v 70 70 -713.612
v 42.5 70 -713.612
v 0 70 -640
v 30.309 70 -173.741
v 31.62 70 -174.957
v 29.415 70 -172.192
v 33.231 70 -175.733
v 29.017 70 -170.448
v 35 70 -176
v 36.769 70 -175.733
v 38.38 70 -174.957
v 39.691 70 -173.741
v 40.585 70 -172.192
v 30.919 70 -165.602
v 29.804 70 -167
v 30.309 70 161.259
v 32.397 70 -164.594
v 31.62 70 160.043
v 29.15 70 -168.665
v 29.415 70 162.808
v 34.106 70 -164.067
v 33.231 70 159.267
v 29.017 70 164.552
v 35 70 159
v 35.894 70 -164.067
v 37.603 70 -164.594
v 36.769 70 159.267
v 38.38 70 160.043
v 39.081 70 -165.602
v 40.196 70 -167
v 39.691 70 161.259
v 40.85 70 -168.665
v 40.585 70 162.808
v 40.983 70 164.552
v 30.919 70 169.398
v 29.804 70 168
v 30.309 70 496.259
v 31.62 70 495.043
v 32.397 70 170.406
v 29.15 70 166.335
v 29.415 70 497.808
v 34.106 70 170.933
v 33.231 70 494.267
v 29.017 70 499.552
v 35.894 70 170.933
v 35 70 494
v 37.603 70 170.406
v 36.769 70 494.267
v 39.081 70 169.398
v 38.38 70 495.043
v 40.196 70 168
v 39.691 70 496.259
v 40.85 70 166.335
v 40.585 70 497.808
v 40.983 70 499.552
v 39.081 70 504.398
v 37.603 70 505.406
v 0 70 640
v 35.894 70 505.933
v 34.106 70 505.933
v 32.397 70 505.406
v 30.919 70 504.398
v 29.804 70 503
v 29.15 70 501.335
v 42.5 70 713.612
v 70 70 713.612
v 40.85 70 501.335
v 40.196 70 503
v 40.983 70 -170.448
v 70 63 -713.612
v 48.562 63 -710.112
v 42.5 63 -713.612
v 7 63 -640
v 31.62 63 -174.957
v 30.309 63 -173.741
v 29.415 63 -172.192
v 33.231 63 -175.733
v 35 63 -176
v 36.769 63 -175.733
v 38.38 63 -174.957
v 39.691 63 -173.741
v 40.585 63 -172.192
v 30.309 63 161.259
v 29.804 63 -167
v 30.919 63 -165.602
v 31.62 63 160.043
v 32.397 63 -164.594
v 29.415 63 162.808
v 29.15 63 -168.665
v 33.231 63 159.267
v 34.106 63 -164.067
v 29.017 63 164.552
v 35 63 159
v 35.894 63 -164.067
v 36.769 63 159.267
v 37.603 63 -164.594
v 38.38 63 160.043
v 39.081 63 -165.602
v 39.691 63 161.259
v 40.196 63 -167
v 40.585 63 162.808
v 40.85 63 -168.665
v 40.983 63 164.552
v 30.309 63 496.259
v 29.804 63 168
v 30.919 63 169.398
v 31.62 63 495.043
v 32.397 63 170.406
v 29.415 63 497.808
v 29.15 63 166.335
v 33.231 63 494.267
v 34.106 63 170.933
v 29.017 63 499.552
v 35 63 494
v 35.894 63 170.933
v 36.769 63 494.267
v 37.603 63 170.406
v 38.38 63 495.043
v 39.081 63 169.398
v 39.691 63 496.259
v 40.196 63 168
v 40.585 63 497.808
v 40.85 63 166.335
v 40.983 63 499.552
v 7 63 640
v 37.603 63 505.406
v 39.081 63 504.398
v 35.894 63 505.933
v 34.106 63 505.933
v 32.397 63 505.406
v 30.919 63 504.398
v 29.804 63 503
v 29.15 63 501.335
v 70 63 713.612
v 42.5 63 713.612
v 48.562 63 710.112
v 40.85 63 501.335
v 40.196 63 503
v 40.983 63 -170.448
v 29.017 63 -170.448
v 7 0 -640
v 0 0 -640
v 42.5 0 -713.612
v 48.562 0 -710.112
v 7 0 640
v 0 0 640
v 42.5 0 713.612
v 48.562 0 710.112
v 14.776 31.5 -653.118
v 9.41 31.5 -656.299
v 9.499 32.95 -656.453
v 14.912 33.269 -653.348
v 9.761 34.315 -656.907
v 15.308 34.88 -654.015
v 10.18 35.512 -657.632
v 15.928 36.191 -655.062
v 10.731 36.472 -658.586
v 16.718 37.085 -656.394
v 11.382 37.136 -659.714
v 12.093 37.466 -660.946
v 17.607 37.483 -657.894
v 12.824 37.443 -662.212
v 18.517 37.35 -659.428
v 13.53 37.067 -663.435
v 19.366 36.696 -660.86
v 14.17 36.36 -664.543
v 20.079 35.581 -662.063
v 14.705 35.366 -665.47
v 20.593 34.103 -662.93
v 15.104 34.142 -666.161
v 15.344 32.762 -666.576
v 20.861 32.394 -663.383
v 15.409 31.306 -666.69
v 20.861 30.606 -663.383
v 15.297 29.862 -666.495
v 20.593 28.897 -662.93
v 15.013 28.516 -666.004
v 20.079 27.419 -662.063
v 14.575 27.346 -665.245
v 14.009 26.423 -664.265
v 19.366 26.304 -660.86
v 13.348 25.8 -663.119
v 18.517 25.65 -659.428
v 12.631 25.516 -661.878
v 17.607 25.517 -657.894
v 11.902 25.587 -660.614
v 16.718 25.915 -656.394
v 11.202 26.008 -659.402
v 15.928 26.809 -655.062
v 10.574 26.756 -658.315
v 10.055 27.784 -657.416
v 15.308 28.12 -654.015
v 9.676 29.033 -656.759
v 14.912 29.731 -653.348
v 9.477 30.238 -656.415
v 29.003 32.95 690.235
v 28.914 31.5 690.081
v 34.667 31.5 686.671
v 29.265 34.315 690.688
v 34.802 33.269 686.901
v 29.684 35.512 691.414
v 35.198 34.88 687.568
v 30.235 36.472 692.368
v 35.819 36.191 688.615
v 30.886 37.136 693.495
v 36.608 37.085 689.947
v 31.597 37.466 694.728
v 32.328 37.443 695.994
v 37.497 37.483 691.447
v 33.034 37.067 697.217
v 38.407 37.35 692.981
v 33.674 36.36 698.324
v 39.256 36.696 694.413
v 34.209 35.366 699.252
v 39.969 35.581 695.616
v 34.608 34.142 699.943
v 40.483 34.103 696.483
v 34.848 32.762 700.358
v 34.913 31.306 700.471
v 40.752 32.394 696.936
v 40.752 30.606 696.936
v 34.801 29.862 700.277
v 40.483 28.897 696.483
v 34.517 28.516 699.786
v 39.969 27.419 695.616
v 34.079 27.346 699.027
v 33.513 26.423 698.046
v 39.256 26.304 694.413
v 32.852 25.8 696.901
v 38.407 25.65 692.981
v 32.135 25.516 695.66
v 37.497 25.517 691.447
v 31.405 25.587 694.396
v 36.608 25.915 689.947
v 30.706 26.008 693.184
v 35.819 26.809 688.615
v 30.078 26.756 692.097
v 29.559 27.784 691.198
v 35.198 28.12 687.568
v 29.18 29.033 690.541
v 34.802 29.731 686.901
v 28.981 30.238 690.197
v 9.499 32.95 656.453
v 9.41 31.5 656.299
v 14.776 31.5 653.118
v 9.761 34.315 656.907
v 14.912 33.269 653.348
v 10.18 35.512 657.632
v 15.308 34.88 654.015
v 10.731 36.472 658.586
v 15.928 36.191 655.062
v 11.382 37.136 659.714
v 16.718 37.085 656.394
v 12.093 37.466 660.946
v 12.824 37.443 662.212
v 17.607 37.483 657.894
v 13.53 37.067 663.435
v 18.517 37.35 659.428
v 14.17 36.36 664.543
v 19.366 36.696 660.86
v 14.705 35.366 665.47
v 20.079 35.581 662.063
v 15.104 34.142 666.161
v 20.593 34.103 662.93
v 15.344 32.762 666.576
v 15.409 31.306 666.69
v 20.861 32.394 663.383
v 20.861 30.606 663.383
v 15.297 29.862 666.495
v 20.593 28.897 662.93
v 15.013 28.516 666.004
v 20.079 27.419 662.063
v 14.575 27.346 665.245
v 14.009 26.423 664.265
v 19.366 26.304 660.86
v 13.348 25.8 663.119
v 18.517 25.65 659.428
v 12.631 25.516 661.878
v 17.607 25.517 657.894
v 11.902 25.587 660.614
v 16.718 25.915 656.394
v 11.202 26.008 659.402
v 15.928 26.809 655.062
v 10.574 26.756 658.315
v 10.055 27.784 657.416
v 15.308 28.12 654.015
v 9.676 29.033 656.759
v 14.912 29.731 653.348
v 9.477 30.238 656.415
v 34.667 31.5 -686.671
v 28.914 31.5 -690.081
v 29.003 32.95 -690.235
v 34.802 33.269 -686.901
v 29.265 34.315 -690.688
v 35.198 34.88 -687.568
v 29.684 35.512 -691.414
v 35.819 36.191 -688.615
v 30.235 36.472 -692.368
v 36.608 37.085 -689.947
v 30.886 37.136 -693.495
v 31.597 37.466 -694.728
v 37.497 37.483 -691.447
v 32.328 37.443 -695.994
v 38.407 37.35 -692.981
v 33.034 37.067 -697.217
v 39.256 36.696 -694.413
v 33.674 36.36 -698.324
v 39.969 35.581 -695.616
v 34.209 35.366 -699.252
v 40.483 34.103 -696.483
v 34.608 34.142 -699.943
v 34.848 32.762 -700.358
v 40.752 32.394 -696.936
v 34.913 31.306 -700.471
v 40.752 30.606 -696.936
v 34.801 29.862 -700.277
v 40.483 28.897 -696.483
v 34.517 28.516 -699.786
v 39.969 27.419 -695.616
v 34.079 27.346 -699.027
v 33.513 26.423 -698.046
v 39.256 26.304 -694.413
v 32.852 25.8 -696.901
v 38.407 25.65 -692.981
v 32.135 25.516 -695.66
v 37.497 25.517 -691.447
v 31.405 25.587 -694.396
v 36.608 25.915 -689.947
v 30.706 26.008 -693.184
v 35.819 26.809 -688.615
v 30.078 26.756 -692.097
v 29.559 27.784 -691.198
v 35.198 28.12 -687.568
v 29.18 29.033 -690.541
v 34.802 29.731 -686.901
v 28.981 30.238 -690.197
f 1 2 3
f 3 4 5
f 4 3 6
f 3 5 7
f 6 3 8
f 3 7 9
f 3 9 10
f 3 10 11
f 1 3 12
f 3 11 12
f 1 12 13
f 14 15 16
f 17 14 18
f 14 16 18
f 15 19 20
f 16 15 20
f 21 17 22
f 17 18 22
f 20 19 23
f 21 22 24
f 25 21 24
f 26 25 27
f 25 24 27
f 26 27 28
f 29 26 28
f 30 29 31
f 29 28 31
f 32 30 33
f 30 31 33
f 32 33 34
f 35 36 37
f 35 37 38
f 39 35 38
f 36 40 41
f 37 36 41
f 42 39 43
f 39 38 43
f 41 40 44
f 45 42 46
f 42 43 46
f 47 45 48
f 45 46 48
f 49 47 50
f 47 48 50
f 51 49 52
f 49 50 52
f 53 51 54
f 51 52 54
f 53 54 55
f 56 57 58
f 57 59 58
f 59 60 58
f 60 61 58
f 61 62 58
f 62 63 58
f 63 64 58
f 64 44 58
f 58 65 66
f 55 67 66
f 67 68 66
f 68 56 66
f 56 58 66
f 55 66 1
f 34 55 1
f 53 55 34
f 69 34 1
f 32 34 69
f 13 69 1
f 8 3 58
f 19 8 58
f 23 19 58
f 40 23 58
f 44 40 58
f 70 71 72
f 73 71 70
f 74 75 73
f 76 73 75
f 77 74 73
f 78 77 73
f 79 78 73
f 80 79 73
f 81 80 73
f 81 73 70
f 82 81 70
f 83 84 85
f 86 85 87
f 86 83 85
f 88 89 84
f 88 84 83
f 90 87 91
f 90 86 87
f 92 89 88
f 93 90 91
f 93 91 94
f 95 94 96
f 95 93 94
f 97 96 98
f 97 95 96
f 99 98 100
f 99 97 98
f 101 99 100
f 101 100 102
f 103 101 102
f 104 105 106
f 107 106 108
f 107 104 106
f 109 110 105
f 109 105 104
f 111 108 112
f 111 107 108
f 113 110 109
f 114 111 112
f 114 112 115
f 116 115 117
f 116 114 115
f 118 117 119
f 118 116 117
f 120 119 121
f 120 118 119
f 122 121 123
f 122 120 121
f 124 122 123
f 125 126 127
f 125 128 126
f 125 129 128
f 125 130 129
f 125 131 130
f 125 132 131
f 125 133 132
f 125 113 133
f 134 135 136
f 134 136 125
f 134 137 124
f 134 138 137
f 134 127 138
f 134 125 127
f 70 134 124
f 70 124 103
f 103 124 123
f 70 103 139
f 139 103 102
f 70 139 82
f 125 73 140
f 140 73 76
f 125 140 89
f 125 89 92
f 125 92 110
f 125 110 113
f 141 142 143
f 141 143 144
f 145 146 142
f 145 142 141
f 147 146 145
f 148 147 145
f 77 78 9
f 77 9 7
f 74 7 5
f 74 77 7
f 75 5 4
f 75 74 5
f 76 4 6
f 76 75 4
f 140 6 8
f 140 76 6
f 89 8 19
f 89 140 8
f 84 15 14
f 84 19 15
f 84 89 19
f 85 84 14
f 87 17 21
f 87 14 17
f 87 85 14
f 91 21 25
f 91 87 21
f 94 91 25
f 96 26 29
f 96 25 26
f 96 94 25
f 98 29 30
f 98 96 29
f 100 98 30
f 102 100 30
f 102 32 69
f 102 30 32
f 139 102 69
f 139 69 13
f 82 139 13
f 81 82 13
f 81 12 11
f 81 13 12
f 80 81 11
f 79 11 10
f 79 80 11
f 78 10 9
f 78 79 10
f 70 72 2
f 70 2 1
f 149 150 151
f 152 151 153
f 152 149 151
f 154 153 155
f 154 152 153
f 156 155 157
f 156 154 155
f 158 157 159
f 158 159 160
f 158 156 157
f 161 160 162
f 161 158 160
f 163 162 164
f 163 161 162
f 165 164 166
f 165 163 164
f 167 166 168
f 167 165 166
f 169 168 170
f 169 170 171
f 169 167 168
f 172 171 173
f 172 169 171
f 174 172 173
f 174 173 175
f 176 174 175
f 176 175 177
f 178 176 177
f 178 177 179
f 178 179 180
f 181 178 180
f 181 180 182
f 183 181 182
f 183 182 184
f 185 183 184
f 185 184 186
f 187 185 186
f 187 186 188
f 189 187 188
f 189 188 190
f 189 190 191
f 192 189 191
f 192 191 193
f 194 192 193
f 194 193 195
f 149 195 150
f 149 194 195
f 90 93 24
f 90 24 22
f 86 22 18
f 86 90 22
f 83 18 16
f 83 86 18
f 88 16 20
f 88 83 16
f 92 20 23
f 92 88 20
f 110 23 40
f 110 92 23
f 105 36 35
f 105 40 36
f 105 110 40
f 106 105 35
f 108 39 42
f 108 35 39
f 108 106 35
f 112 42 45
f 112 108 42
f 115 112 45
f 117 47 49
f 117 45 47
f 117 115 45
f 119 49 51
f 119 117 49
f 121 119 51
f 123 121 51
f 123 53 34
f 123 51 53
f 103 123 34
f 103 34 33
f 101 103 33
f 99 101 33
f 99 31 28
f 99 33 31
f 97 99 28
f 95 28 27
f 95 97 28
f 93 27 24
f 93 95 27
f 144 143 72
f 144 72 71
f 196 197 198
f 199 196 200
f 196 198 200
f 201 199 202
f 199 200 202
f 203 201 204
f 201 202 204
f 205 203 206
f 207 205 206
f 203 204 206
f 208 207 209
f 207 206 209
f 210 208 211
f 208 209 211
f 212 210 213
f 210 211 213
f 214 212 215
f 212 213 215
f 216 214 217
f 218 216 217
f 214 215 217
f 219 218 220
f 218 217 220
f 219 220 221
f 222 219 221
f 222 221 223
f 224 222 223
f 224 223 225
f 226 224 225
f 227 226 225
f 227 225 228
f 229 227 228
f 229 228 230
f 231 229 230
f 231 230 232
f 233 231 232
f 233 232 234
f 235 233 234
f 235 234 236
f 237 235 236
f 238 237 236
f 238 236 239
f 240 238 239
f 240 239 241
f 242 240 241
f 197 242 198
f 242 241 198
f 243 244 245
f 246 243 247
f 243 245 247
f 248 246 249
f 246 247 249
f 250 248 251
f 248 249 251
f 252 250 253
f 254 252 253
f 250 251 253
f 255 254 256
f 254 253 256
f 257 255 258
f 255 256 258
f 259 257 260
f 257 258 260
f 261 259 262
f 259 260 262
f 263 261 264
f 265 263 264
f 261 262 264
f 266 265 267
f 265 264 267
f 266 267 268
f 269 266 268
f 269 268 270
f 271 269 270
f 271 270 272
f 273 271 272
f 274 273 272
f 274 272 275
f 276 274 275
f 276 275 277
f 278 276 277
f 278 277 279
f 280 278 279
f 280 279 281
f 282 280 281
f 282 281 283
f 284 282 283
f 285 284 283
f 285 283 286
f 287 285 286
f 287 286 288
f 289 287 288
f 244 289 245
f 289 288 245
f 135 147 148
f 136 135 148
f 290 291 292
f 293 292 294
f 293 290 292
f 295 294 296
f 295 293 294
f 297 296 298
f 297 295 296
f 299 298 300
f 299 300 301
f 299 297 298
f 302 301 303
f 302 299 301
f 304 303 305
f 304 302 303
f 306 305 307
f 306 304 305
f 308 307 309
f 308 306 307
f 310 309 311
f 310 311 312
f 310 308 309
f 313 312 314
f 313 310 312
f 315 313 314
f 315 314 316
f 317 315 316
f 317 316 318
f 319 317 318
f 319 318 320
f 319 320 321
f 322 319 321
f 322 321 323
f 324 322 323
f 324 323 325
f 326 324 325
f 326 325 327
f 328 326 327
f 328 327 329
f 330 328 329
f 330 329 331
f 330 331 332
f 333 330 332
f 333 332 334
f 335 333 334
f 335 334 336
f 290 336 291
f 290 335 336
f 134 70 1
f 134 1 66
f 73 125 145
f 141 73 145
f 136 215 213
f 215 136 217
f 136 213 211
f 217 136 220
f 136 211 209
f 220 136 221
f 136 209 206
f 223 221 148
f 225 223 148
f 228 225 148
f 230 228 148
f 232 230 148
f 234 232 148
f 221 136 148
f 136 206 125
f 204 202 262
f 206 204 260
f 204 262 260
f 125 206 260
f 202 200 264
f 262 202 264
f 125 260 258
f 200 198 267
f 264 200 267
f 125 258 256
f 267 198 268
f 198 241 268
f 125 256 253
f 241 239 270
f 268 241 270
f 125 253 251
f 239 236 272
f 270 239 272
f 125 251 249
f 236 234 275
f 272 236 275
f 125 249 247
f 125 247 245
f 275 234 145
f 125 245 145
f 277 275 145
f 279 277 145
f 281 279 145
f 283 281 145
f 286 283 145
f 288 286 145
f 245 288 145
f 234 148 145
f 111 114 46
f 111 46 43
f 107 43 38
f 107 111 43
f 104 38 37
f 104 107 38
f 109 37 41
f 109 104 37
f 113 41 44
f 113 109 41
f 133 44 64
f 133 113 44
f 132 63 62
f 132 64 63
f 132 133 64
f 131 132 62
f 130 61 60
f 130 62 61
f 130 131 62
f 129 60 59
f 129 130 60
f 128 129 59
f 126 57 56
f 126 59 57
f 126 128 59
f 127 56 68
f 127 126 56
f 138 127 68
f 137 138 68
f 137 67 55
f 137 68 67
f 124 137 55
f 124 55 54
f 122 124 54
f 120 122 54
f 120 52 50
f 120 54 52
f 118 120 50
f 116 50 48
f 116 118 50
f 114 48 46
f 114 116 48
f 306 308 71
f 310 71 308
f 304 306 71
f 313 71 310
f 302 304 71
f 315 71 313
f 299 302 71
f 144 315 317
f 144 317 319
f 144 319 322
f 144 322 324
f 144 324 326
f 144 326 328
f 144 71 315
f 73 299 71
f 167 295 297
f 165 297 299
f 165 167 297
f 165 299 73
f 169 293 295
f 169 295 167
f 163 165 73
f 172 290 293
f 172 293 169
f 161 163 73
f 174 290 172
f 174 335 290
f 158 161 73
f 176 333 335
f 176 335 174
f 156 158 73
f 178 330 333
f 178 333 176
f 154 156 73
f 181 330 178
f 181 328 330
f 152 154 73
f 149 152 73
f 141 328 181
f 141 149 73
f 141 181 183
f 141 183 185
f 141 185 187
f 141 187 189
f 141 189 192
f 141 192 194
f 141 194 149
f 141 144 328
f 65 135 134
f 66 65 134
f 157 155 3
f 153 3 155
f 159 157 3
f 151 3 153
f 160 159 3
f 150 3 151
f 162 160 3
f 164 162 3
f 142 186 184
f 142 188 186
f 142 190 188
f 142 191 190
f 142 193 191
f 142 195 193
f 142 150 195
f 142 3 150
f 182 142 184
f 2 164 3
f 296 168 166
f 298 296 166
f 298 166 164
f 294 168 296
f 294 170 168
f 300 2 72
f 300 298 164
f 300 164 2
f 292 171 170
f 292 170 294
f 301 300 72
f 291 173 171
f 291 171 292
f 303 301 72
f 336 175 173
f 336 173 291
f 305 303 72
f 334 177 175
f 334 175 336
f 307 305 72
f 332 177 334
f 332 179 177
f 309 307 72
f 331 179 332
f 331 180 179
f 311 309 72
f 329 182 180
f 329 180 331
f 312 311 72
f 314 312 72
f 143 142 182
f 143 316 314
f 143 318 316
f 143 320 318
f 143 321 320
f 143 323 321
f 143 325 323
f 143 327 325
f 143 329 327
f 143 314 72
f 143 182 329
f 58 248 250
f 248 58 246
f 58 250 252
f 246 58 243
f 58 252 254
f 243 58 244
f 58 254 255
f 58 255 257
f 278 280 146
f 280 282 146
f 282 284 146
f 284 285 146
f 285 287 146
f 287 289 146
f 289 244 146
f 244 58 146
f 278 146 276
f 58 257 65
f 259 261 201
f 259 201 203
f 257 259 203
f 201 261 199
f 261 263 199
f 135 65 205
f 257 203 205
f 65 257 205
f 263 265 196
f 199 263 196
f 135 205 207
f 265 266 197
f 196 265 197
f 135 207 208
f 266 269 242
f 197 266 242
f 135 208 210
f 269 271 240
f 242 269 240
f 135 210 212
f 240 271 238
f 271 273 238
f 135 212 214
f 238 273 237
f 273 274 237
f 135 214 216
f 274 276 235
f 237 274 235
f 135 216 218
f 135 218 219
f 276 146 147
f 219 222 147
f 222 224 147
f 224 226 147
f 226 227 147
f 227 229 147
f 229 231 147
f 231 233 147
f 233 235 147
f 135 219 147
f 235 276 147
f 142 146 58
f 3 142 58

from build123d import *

# Parameters (mm, degrees)
BOSS_EXTRUDE1_DEPTH     = 640
BOSS_EXTRUDE2_DEPTH     = 63
BOSS_EXTRUDE3_DEPTH     = 7
SKETCH26_R              = 6
CUT_EXTRUDE2_DEPTH      = 10
CUT_EXTRUDE1_DEPTH      = 10
CUT_EXTRUDE1_DEPTH_BACK = 10
SKETCH28_R              = 6


with BuildPart() as part:
    # Sketch1 → Boss-Extrude1 (new body)
    with BuildSketch(Plane.XY):
        Polygon((0, 0), (0, 70), (70, 70), (70, 63), (7, 63), (7, 0), align=None)
    extrude(amount=BOSS_EXTRUDE1_DEPTH)

    # Sketch23 → Boss-Extrude2 (add)
    with BuildSketch(Plane(origin=(0, 0, 0), x_dir=(1, 0, 0), z_dir=(0, 1, 0))):
        Polygon((0, -640), (42.5, -713.612159322), (48.562177826, -710.112159322), (7, -640), align=None)
    extrude(amount=BOSS_EXTRUDE2_DEPTH)

    # Sketch25 → Boss-Extrude3 (add)
    with BuildSketch(Plane(origin=(0, 63, 0), x_dir=(1, 0, 0), z_dir=(0, 1, 0))):
        Polygon((70, -640), (0, -640), (42.5, -713.612159322), (70, -713.612159322), align=None)
    extrude(amount=BOSS_EXTRUDE3_DEPTH)

    # Sketch26 → Cut-Extrude2 (cut)
    with BuildSketch(Plane(origin=(-275.556719825, 0, 163.348804279), x_dir=(-0.5099316128113042, 0, -0.8602149442178172), z_dir=(0.8602149442178172, 0, -0.5099316128113042))):
        with Locations((-614.36248118, 31.5)):
            Circle(SKETCH26_R)
        with Locations((-575.357085589, 31.5)):
            Circle(SKETCH26_R)
    extrude(amount=-CUT_EXTRUDE2_DEPTH, mode=Mode.SUBTRACT)

    # Mirror1: part across plane


with BuildPart() as part_1:
    add(part.part)
    add(part.part.mirror(Plane.XY))

    # Sketch28 → Cut-Extrude1 (cut, two sides: drawn at the far end of the back side and taken through both)
    with BuildSketch(Plane(origin=(0, 70, 0), x_dir=(1, 0, 0), z_dir=(0, 1, 0)).offset(-CUT_EXTRUDE1_DEPTH_BACK)):
        with Locations((35, -500)):
            Circle(SKETCH28_R)
        with Locations((35, -165)):
            Circle(SKETCH28_R)
        with Locations((35, 170)):
            Circle(SKETCH28_R)
    extrude(amount=CUT_EXTRUDE1_DEPTH + CUT_EXTRUDE1_DEPTH_BACK, mode=Mode.SUBTRACT)


solid = part_1.part
